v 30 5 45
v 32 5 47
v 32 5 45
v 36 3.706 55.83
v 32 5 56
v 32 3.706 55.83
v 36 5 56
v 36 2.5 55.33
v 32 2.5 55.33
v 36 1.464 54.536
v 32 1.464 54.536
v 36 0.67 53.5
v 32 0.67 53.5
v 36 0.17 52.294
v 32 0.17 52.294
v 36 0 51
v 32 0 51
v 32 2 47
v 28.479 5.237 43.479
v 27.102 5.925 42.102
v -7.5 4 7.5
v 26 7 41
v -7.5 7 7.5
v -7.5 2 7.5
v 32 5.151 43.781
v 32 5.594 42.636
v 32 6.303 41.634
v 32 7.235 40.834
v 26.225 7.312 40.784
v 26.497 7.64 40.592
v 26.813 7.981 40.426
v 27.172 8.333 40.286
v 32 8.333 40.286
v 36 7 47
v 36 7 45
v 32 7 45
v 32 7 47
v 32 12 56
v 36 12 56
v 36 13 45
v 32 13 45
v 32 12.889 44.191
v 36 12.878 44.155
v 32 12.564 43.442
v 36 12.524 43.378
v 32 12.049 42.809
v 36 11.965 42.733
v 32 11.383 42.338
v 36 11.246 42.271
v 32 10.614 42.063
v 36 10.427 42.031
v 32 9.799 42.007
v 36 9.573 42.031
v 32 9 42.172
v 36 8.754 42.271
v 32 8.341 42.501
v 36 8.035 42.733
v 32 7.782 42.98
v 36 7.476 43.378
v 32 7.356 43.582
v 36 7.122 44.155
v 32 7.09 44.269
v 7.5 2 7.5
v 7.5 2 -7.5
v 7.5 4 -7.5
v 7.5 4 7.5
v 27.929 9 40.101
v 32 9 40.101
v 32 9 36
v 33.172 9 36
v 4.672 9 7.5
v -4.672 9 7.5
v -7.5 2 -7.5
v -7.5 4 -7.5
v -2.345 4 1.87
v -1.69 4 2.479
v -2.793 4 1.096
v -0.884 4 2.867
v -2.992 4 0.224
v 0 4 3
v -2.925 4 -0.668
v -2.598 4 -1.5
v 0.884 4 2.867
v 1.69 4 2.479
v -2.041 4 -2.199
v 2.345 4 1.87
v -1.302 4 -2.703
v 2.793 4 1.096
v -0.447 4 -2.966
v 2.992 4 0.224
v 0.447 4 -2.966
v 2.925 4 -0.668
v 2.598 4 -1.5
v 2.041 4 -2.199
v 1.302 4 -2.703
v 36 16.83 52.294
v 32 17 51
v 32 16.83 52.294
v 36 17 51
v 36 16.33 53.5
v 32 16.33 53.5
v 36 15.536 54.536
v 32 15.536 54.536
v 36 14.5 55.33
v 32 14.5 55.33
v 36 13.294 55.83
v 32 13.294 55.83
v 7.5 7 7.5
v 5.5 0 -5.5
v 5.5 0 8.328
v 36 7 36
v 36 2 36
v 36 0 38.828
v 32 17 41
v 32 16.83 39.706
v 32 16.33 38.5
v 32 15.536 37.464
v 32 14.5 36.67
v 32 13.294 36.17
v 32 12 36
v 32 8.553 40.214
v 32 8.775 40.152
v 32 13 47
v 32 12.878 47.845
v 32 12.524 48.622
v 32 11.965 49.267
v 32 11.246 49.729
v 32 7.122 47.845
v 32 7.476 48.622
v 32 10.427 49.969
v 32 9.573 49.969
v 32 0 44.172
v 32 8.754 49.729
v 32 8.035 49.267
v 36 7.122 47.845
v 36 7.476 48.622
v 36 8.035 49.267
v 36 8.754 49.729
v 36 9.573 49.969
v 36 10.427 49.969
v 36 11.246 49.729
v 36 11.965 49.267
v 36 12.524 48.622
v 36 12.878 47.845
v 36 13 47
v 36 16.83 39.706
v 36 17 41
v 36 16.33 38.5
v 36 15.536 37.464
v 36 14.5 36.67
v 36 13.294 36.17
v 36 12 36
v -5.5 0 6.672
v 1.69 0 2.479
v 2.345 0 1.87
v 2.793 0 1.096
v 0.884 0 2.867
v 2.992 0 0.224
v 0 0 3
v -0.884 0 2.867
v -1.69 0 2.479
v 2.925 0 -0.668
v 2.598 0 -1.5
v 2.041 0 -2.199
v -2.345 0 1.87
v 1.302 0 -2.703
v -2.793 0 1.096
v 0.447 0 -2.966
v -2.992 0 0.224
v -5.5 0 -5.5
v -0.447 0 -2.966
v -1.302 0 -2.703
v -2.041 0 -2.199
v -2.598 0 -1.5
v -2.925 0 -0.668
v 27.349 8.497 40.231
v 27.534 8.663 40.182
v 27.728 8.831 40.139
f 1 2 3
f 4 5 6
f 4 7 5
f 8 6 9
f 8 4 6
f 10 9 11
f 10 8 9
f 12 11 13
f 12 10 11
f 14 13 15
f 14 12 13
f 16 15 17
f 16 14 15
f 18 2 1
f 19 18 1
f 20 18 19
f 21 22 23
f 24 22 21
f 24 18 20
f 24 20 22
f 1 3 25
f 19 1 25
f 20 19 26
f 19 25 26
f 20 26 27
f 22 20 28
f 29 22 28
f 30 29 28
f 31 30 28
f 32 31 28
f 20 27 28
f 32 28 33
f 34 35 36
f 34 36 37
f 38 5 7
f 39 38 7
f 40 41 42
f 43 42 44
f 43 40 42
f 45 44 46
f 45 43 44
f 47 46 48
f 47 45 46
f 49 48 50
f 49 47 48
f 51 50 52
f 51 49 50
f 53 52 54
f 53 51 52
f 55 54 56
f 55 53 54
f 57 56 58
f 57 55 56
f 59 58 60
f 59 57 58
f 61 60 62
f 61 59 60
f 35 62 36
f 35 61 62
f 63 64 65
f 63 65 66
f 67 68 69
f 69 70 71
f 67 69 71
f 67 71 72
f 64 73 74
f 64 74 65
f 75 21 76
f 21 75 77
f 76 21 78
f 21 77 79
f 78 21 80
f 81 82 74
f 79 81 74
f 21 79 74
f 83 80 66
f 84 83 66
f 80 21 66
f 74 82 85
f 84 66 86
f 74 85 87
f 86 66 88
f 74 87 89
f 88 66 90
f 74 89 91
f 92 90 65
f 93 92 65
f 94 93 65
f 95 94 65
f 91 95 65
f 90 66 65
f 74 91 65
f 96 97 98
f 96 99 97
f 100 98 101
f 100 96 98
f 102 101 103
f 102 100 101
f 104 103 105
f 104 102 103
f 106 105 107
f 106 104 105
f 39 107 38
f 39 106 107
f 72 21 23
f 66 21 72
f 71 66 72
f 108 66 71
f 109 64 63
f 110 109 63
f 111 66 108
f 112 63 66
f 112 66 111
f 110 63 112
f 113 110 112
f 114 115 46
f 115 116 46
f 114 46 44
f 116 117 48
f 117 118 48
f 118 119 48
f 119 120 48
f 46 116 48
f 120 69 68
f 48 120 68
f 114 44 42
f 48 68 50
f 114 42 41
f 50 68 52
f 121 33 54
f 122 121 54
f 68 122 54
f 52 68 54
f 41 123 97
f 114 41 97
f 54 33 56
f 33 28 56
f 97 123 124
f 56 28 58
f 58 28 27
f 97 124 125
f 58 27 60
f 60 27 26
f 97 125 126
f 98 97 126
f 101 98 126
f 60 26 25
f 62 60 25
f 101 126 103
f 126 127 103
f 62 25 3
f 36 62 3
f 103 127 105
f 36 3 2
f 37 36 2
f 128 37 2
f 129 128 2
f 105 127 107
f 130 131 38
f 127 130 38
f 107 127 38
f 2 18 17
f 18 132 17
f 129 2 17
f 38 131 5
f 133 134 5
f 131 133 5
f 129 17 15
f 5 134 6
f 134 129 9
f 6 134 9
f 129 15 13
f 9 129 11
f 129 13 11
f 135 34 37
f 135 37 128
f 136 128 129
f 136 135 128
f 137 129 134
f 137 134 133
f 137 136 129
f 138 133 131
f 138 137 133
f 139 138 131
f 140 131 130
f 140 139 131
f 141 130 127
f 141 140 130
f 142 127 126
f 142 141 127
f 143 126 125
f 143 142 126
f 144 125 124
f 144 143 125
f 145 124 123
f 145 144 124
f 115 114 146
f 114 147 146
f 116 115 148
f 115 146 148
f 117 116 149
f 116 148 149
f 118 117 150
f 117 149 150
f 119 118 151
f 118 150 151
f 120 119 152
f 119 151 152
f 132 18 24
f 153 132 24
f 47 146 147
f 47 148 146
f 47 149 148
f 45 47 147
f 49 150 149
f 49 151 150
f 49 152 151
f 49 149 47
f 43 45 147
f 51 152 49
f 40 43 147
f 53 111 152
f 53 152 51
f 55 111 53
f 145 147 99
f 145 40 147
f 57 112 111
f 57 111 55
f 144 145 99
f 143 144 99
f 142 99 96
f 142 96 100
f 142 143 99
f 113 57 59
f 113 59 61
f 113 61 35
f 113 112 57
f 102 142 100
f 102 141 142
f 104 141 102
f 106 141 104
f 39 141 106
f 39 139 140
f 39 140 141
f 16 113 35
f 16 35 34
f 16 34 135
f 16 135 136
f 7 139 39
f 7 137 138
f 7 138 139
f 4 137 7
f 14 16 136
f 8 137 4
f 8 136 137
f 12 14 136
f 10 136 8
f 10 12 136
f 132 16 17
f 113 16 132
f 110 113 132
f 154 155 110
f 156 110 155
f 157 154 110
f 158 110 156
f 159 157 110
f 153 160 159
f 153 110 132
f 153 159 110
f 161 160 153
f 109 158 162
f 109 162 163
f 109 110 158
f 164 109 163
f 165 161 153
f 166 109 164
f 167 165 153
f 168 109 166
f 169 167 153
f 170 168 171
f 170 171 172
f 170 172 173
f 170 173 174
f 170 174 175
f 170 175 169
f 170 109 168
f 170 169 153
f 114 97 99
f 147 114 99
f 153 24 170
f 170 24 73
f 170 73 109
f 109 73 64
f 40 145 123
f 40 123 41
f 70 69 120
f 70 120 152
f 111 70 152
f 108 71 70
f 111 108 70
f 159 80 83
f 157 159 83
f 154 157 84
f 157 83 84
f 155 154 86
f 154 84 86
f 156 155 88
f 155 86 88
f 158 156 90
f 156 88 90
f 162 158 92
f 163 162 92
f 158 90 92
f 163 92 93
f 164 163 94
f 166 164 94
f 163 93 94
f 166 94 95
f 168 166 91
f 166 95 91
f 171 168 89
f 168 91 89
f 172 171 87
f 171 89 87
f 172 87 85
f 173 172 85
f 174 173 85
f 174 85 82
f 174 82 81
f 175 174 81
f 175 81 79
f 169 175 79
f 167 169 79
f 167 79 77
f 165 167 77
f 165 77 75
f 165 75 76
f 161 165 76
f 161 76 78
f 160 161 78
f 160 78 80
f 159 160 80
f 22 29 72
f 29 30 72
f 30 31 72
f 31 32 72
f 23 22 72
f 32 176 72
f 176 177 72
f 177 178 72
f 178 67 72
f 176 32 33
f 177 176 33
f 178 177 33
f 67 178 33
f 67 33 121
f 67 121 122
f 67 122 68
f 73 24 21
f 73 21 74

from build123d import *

# Parameters (mm, degrees)
BOSS_EXTRUDE1_DEPTH = 9
SKETCH2_W           = 4
SKETCH2_H           = 20
BOSS_EXTRUDE2_DEPTH = 17
SKETCH3_W           = 15
SKETCH3_H           = 5
CUT_EXTRUDE1_DEPTH  = 66.094162565
SKETCH4_R           = 3
CUT_EXTRUDE2_DEPTH  = 68.830671528
CUT_EXTRUDE3_DEPTH  = 73.919476136
CUT_EXTRUDE4_DEPTH  = 71.606302835
FILLET1_R           = 5
CHAMFER1_SIZE       = 2


with BuildPart() as part:
    # Sketch1 → Boss-Extrude1 (new body)
    with BuildSketch(Plane(origin=(0, 0, 0), x_dir=(1, 0, 0), z_dir=(0, 1, 0))):
        Polygon((7.5, -7.5), (36, -36), (36, -51), (-7.5, -7.5), (-7.5, 7.5), (7.5, 7.5), align=None)
    extrude(amount=BOSS_EXTRUDE1_DEPTH)

    # Sketch2 → Boss-Extrude2 (add)
    with BuildSketch(Plane.XZ):
        with Locations((34, 46)):
            Rectangle(SKETCH2_W, SKETCH2_H)
    extrude(amount=-BOSS_EXTRUDE2_DEPTH)

    # Sketch3 → Cut-Extrude1 (cut, through all)
    with BuildSketch(Plane(origin=(7.5, 0, 0), x_dir=(0, 0, -1), z_dir=(1, 0, 0))):
        with Locations((0, 6.5)):
            Rectangle(SKETCH3_W, SKETCH3_H)
    extrude(amount=-CUT_EXTRUDE1_DEPTH, mode=Mode.SUBTRACT)

    # Sketch4 → Cut-Extrude2 (cut, through all)
    with BuildSketch(Plane(origin=(0, 4, 0), x_dir=(1, 0, 0), z_dir=(0, 1, 0))):
        with Locations(Location((0, 0, 0), (0, 0, 270))):
            Circle(SKETCH4_R)
    extrude(amount=-CUT_EXTRUDE2_DEPTH, mode=Mode.SUBTRACT)

    # Sketch5 → Cut-Extrude3 (cut, through all)
    with BuildSketch(Plane(origin=(36, 0, 0), x_dir=(0, 0, -1), z_dir=(1, 0, 0))):
        with BuildLine():
            Line((-45, 7), (-47, 7))
            ThreePointArc((-47, 7), (-50, 10), (-47, 13))
            Line((-47, 13), (-45, 13))
            ThreePointArc((-45, 13), (-42, 10), (-45, 7))
        make_face()
    extrude(amount=-CUT_EXTRUDE3_DEPTH, mode=Mode.SUBTRACT)

    # Sketch6 → Cut-Extrude4 (cut, through all)
    with BuildSketch(Plane.ZY.offset(-32)):
        with BuildLine():
            Line((47, 5), (45, 5))
            ThreePointArc((45, 5), (42.113248654, 5.917517095), (40.285954792, 8.333333333))
            ThreePointArc((40.285954792, 8.333333333), (40.917517095, 12.886751346), (45, 15))
            Line((45, 15), (47, 15))
            ThreePointArc((47, 15), (51.082482905, 12.886751346), (51.714045208, 8.333333333))
            ThreePointArc((51.714045208, 8.333333333), (49.886751346, 5.917517095), (47, 5))
        make_face()
        with BuildLine():
            Line((47, 7), (45, 7))
            ThreePointArc((45, 7), (43.267949192, 7.550510257), (42.171572875, 9))
            ThreePointArc((42.171572875, 9), (42.550510257, 11.732050808), (45, 13))
            Line((45, 13), (47, 13))
            ThreePointArc((47, 13), (49.449489743, 11.732050808), (49.828427125, 9))
            ThreePointArc((49.828427125, 9), (48.732050808, 7.550510257), (47, 7))
        make_face(mode=Mode.SUBTRACT)
    extrude(amount=CUT_EXTRUDE4_DEPTH, mode=Mode.SUBTRACT)

    # Fillet1
    fillet1_edges = [part.edges().sort_by_distance(p)[0] for p in [
        (34, 0, 56),
        (34, 17, 36),
        (34, 17, 56),
    ]]
    fillet(fillet1_edges, radius=FILLET1_R)

    # Chamfer1
    chamfer1_edges = [part.edges().sort_by_distance(p)[0] for p in [
        (21.75, 0, 21.75),
        (7.5, 0, 0),
        (0, 0, -7.5),
        (-7.5, 0, 0),
        (12.25, 0, 27.25),
        (8.800510257, 9, 23.800510257),
        (21.75, 9, 21.75),
    ]]
    chamfer(chamfer1_edges, length=CHAMFER1_SIZE)


solid = part.part
